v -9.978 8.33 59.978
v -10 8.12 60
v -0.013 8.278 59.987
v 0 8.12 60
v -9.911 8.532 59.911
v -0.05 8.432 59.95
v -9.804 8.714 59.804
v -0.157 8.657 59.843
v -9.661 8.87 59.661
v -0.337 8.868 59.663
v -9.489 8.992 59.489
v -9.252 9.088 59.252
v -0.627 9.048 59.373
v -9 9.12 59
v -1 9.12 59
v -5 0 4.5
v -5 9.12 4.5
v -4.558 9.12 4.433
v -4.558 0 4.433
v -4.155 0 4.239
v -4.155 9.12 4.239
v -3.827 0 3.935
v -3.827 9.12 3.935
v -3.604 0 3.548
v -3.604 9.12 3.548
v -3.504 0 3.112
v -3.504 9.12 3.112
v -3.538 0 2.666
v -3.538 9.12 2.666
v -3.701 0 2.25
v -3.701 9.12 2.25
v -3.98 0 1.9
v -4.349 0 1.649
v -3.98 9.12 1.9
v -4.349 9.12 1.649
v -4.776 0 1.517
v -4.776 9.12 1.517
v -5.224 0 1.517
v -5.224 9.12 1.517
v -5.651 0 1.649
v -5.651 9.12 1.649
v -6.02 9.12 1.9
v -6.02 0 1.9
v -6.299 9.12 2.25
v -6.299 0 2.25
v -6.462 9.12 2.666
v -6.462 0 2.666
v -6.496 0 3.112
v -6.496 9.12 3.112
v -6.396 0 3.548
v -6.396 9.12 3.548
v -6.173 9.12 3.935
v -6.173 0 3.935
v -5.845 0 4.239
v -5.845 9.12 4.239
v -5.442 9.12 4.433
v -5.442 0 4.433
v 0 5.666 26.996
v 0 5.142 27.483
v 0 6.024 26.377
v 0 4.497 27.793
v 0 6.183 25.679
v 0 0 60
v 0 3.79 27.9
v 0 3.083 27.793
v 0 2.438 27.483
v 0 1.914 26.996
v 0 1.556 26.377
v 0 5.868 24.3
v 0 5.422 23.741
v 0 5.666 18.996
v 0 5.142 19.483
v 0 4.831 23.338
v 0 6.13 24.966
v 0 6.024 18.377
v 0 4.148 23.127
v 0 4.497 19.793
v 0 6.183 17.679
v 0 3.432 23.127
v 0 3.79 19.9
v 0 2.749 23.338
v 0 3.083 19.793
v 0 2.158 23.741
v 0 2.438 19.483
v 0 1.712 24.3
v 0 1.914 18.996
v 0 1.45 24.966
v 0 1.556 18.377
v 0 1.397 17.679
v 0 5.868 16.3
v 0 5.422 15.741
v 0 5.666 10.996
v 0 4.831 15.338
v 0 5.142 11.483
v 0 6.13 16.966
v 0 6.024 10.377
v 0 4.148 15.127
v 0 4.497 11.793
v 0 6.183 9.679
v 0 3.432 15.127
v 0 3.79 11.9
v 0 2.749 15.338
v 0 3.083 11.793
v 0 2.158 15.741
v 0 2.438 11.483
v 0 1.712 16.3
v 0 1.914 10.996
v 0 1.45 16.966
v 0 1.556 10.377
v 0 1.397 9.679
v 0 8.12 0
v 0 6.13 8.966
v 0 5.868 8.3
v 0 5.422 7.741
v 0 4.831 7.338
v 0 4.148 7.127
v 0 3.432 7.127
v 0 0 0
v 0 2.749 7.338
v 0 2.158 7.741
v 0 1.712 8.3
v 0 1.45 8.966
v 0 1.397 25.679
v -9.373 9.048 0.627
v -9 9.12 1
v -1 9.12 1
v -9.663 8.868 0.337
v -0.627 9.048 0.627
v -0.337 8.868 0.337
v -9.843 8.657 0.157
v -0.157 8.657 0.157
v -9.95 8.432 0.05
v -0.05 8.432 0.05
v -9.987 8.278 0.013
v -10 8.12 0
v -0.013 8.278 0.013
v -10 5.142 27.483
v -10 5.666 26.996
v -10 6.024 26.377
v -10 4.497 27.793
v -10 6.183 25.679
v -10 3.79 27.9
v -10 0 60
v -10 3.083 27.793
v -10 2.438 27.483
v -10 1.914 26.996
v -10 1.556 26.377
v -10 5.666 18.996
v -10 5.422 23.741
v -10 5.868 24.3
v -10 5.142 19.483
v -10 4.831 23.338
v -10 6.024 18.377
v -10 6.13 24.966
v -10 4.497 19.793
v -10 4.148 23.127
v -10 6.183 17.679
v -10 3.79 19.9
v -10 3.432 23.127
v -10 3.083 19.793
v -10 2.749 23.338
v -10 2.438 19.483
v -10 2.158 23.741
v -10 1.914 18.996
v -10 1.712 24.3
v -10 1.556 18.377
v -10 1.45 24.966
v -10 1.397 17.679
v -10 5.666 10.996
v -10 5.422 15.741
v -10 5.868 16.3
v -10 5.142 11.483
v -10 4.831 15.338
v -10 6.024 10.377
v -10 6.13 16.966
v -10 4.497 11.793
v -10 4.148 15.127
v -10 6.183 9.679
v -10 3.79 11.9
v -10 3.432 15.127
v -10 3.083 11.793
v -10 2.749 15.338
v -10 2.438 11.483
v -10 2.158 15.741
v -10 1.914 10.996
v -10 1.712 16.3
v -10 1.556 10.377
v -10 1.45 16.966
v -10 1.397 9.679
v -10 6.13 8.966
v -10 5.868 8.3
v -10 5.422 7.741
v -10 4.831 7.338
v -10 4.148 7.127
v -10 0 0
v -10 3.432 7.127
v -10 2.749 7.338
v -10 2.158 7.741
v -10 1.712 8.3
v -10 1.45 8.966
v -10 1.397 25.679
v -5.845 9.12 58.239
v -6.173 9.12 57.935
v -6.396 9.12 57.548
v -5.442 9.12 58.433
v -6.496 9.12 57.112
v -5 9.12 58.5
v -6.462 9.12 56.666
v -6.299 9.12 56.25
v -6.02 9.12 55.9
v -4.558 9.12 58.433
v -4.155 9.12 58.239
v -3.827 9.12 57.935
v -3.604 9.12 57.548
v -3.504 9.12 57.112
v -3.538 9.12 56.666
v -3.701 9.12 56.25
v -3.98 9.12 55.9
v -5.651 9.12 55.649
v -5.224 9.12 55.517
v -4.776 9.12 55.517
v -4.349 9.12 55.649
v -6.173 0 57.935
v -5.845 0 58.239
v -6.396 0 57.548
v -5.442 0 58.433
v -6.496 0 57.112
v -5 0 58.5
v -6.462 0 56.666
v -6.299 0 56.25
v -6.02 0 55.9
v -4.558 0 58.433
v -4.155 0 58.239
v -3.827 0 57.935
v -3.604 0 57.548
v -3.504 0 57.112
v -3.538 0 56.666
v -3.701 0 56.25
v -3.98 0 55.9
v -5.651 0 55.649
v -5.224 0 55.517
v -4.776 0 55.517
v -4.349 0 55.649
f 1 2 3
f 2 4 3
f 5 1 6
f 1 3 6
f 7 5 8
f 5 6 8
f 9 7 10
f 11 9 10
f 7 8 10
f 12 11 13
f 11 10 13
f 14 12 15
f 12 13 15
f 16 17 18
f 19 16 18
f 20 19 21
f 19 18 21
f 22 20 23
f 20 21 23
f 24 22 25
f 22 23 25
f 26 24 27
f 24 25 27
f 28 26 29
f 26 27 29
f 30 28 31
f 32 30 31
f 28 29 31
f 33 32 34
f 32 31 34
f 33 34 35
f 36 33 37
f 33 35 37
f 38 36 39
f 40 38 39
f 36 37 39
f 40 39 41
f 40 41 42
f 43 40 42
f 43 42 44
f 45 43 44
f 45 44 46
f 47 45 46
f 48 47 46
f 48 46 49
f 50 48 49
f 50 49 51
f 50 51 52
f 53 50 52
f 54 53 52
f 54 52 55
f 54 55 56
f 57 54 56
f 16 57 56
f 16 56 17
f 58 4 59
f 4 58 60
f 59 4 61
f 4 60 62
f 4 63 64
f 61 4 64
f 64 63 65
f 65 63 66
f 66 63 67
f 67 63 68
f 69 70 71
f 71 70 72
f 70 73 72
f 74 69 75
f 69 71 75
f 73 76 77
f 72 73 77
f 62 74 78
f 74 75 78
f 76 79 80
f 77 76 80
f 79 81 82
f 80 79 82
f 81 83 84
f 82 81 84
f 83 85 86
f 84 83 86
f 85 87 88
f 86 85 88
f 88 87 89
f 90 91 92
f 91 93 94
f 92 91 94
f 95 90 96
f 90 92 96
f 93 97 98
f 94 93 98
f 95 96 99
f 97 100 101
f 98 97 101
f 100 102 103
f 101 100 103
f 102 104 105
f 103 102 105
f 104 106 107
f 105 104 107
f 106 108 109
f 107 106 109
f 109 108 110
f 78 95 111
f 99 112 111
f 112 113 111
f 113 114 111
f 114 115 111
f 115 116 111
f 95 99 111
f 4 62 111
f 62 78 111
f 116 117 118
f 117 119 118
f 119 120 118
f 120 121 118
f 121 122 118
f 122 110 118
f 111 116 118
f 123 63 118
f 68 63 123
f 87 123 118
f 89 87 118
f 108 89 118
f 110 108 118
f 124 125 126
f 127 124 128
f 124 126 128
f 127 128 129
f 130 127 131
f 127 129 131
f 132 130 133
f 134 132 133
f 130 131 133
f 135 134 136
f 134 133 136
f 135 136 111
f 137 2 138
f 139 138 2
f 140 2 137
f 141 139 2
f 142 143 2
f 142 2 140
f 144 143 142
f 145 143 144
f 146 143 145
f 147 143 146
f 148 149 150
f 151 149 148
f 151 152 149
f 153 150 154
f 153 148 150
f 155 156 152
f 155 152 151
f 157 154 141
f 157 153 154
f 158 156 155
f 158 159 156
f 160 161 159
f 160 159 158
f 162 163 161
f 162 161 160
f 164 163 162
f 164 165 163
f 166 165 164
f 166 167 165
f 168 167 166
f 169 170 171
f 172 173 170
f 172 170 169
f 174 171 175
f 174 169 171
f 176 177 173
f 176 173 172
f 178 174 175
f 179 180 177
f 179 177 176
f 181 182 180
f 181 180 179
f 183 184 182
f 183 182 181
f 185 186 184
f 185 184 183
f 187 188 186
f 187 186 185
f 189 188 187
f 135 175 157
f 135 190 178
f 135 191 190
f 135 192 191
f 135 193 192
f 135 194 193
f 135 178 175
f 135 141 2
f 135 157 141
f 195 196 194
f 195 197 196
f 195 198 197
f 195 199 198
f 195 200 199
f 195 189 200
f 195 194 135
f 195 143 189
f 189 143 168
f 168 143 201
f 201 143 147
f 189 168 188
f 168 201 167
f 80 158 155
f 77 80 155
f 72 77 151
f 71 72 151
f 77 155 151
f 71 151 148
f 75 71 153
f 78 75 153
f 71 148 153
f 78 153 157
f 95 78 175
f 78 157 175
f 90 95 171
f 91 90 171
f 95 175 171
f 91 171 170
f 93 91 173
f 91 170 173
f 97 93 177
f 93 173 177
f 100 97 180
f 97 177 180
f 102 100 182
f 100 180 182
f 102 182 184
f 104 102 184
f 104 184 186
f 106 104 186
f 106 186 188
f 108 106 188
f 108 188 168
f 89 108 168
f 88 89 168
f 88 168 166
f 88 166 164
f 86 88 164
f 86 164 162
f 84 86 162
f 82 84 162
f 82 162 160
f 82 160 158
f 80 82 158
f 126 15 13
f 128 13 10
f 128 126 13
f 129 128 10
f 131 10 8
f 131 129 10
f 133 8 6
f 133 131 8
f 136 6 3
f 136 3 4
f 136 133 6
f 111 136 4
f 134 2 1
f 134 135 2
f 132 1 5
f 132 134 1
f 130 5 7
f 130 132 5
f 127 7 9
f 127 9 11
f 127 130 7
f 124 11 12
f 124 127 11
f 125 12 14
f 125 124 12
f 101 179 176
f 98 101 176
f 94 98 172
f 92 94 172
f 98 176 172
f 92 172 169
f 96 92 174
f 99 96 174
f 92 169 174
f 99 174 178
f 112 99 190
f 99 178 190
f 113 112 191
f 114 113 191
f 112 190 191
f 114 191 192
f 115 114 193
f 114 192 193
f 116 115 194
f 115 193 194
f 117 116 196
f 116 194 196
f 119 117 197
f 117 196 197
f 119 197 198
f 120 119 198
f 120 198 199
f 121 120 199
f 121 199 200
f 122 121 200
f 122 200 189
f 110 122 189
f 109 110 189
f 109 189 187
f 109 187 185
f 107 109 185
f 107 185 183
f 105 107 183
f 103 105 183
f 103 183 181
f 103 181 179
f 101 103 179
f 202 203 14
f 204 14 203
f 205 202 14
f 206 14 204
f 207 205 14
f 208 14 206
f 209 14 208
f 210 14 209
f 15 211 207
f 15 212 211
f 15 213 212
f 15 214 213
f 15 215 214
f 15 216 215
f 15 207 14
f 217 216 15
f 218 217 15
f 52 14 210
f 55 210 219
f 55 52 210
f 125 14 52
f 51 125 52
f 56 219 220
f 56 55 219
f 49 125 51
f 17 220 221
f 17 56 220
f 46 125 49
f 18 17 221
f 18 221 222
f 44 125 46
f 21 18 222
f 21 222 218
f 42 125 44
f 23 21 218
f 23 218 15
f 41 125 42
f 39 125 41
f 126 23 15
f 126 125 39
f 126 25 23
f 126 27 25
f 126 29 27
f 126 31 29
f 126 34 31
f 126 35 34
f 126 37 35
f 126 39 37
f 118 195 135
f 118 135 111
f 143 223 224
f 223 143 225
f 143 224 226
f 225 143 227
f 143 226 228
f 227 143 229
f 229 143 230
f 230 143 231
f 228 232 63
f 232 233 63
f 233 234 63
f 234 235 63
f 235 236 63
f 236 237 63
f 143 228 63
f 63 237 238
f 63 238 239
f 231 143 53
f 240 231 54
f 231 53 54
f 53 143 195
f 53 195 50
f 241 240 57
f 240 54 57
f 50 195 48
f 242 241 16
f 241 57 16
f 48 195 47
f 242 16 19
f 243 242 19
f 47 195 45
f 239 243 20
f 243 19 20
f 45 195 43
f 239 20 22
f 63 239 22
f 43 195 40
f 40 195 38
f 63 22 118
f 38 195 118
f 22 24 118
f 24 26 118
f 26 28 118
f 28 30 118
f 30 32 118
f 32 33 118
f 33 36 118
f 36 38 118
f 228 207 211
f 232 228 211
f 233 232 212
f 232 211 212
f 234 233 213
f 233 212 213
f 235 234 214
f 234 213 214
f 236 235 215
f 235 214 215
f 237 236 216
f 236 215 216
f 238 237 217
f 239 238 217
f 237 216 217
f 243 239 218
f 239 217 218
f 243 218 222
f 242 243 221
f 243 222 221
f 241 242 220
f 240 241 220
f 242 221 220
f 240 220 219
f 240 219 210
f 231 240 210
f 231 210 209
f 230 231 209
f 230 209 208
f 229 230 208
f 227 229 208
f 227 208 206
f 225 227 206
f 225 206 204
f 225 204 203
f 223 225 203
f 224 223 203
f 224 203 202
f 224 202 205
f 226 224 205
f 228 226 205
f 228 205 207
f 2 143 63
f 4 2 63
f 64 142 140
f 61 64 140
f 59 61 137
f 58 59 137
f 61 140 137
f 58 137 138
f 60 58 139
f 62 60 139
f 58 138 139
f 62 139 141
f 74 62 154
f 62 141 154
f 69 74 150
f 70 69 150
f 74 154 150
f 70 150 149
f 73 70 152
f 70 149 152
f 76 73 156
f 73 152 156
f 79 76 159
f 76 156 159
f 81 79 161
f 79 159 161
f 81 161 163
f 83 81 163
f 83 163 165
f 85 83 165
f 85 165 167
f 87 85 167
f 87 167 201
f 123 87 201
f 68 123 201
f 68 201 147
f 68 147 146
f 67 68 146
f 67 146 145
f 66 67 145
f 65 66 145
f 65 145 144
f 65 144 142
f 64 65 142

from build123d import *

# Parameters (mm, degrees)
CROQUIS1_W              = 10
CROQUIS1_H              = 60
SALIENTE_EXTRUIR1_DEPTH = 9.12
CROQUIS2_R              = 2.4
CORTAR_EXTRUIR1_DEPTH   = 62.507514988
CROQUIS4_R              = 1.5
CORTAR_EXTRUIR2_DEPTH   = 62.507514988
REDONDEO1_R             = 1


with BuildPart() as part:
    # Croquis1 → Saliente-Extruir1 (new body)
    with BuildSketch(Plane(origin=(0, 0, 0), x_dir=(1, 0, 0), z_dir=(0, 1, 0))):
        with Locations((-5, -30)):
            Rectangle(CROQUIS1_W, CROQUIS1_H)
    extrude(amount=SALIENTE_EXTRUIR1_DEPTH)

    # Croquis2 → Cortar-Extruir1 (cut, through all)
    with BuildSketch(Plane.ZY.offset(10)):
        with Locations((17.5, 3.79)):
            Circle(CROQUIS2_R)
        with Locations((9.5, 3.79)):
            Circle(CROQUIS2_R)
        with Locations((25.5, 3.79)):
            Circle(CROQUIS2_R)
    extrude(amount=-CORTAR_EXTRUIR1_DEPTH, mode=Mode.SUBTRACT)

    # Croquis4 → Cortar-Extruir2 (cut, through all)
    with BuildSketch(Plane(origin=(0, 9.12, 0), x_dir=(1, 0, 0), z_dir=(0, 1, 0))):
        with Locations(Location((-5, -3, 0), (0, 0, 270))):
            Circle(CROQUIS4_R)
        with Locations(Location((-5, -57, 0), (0, 0, 270))):
            Circle(CROQUIS4_R)
    extrude(amount=-CORTAR_EXTRUIR2_DEPTH, mode=Mode.SUBTRACT)

    # Redondeo1
    redondeo1_edges = [part.edges().sort_by_distance(p)[0] for p in [
        (0, 9.12, 30),
        (-5, 9.12, 0),
        (-10, 9.12, 30),
        (-5, 9.12, 60),
    ]]
    fillet(redondeo1_edges, radius=REDONDEO1_R)


solid = part.part
